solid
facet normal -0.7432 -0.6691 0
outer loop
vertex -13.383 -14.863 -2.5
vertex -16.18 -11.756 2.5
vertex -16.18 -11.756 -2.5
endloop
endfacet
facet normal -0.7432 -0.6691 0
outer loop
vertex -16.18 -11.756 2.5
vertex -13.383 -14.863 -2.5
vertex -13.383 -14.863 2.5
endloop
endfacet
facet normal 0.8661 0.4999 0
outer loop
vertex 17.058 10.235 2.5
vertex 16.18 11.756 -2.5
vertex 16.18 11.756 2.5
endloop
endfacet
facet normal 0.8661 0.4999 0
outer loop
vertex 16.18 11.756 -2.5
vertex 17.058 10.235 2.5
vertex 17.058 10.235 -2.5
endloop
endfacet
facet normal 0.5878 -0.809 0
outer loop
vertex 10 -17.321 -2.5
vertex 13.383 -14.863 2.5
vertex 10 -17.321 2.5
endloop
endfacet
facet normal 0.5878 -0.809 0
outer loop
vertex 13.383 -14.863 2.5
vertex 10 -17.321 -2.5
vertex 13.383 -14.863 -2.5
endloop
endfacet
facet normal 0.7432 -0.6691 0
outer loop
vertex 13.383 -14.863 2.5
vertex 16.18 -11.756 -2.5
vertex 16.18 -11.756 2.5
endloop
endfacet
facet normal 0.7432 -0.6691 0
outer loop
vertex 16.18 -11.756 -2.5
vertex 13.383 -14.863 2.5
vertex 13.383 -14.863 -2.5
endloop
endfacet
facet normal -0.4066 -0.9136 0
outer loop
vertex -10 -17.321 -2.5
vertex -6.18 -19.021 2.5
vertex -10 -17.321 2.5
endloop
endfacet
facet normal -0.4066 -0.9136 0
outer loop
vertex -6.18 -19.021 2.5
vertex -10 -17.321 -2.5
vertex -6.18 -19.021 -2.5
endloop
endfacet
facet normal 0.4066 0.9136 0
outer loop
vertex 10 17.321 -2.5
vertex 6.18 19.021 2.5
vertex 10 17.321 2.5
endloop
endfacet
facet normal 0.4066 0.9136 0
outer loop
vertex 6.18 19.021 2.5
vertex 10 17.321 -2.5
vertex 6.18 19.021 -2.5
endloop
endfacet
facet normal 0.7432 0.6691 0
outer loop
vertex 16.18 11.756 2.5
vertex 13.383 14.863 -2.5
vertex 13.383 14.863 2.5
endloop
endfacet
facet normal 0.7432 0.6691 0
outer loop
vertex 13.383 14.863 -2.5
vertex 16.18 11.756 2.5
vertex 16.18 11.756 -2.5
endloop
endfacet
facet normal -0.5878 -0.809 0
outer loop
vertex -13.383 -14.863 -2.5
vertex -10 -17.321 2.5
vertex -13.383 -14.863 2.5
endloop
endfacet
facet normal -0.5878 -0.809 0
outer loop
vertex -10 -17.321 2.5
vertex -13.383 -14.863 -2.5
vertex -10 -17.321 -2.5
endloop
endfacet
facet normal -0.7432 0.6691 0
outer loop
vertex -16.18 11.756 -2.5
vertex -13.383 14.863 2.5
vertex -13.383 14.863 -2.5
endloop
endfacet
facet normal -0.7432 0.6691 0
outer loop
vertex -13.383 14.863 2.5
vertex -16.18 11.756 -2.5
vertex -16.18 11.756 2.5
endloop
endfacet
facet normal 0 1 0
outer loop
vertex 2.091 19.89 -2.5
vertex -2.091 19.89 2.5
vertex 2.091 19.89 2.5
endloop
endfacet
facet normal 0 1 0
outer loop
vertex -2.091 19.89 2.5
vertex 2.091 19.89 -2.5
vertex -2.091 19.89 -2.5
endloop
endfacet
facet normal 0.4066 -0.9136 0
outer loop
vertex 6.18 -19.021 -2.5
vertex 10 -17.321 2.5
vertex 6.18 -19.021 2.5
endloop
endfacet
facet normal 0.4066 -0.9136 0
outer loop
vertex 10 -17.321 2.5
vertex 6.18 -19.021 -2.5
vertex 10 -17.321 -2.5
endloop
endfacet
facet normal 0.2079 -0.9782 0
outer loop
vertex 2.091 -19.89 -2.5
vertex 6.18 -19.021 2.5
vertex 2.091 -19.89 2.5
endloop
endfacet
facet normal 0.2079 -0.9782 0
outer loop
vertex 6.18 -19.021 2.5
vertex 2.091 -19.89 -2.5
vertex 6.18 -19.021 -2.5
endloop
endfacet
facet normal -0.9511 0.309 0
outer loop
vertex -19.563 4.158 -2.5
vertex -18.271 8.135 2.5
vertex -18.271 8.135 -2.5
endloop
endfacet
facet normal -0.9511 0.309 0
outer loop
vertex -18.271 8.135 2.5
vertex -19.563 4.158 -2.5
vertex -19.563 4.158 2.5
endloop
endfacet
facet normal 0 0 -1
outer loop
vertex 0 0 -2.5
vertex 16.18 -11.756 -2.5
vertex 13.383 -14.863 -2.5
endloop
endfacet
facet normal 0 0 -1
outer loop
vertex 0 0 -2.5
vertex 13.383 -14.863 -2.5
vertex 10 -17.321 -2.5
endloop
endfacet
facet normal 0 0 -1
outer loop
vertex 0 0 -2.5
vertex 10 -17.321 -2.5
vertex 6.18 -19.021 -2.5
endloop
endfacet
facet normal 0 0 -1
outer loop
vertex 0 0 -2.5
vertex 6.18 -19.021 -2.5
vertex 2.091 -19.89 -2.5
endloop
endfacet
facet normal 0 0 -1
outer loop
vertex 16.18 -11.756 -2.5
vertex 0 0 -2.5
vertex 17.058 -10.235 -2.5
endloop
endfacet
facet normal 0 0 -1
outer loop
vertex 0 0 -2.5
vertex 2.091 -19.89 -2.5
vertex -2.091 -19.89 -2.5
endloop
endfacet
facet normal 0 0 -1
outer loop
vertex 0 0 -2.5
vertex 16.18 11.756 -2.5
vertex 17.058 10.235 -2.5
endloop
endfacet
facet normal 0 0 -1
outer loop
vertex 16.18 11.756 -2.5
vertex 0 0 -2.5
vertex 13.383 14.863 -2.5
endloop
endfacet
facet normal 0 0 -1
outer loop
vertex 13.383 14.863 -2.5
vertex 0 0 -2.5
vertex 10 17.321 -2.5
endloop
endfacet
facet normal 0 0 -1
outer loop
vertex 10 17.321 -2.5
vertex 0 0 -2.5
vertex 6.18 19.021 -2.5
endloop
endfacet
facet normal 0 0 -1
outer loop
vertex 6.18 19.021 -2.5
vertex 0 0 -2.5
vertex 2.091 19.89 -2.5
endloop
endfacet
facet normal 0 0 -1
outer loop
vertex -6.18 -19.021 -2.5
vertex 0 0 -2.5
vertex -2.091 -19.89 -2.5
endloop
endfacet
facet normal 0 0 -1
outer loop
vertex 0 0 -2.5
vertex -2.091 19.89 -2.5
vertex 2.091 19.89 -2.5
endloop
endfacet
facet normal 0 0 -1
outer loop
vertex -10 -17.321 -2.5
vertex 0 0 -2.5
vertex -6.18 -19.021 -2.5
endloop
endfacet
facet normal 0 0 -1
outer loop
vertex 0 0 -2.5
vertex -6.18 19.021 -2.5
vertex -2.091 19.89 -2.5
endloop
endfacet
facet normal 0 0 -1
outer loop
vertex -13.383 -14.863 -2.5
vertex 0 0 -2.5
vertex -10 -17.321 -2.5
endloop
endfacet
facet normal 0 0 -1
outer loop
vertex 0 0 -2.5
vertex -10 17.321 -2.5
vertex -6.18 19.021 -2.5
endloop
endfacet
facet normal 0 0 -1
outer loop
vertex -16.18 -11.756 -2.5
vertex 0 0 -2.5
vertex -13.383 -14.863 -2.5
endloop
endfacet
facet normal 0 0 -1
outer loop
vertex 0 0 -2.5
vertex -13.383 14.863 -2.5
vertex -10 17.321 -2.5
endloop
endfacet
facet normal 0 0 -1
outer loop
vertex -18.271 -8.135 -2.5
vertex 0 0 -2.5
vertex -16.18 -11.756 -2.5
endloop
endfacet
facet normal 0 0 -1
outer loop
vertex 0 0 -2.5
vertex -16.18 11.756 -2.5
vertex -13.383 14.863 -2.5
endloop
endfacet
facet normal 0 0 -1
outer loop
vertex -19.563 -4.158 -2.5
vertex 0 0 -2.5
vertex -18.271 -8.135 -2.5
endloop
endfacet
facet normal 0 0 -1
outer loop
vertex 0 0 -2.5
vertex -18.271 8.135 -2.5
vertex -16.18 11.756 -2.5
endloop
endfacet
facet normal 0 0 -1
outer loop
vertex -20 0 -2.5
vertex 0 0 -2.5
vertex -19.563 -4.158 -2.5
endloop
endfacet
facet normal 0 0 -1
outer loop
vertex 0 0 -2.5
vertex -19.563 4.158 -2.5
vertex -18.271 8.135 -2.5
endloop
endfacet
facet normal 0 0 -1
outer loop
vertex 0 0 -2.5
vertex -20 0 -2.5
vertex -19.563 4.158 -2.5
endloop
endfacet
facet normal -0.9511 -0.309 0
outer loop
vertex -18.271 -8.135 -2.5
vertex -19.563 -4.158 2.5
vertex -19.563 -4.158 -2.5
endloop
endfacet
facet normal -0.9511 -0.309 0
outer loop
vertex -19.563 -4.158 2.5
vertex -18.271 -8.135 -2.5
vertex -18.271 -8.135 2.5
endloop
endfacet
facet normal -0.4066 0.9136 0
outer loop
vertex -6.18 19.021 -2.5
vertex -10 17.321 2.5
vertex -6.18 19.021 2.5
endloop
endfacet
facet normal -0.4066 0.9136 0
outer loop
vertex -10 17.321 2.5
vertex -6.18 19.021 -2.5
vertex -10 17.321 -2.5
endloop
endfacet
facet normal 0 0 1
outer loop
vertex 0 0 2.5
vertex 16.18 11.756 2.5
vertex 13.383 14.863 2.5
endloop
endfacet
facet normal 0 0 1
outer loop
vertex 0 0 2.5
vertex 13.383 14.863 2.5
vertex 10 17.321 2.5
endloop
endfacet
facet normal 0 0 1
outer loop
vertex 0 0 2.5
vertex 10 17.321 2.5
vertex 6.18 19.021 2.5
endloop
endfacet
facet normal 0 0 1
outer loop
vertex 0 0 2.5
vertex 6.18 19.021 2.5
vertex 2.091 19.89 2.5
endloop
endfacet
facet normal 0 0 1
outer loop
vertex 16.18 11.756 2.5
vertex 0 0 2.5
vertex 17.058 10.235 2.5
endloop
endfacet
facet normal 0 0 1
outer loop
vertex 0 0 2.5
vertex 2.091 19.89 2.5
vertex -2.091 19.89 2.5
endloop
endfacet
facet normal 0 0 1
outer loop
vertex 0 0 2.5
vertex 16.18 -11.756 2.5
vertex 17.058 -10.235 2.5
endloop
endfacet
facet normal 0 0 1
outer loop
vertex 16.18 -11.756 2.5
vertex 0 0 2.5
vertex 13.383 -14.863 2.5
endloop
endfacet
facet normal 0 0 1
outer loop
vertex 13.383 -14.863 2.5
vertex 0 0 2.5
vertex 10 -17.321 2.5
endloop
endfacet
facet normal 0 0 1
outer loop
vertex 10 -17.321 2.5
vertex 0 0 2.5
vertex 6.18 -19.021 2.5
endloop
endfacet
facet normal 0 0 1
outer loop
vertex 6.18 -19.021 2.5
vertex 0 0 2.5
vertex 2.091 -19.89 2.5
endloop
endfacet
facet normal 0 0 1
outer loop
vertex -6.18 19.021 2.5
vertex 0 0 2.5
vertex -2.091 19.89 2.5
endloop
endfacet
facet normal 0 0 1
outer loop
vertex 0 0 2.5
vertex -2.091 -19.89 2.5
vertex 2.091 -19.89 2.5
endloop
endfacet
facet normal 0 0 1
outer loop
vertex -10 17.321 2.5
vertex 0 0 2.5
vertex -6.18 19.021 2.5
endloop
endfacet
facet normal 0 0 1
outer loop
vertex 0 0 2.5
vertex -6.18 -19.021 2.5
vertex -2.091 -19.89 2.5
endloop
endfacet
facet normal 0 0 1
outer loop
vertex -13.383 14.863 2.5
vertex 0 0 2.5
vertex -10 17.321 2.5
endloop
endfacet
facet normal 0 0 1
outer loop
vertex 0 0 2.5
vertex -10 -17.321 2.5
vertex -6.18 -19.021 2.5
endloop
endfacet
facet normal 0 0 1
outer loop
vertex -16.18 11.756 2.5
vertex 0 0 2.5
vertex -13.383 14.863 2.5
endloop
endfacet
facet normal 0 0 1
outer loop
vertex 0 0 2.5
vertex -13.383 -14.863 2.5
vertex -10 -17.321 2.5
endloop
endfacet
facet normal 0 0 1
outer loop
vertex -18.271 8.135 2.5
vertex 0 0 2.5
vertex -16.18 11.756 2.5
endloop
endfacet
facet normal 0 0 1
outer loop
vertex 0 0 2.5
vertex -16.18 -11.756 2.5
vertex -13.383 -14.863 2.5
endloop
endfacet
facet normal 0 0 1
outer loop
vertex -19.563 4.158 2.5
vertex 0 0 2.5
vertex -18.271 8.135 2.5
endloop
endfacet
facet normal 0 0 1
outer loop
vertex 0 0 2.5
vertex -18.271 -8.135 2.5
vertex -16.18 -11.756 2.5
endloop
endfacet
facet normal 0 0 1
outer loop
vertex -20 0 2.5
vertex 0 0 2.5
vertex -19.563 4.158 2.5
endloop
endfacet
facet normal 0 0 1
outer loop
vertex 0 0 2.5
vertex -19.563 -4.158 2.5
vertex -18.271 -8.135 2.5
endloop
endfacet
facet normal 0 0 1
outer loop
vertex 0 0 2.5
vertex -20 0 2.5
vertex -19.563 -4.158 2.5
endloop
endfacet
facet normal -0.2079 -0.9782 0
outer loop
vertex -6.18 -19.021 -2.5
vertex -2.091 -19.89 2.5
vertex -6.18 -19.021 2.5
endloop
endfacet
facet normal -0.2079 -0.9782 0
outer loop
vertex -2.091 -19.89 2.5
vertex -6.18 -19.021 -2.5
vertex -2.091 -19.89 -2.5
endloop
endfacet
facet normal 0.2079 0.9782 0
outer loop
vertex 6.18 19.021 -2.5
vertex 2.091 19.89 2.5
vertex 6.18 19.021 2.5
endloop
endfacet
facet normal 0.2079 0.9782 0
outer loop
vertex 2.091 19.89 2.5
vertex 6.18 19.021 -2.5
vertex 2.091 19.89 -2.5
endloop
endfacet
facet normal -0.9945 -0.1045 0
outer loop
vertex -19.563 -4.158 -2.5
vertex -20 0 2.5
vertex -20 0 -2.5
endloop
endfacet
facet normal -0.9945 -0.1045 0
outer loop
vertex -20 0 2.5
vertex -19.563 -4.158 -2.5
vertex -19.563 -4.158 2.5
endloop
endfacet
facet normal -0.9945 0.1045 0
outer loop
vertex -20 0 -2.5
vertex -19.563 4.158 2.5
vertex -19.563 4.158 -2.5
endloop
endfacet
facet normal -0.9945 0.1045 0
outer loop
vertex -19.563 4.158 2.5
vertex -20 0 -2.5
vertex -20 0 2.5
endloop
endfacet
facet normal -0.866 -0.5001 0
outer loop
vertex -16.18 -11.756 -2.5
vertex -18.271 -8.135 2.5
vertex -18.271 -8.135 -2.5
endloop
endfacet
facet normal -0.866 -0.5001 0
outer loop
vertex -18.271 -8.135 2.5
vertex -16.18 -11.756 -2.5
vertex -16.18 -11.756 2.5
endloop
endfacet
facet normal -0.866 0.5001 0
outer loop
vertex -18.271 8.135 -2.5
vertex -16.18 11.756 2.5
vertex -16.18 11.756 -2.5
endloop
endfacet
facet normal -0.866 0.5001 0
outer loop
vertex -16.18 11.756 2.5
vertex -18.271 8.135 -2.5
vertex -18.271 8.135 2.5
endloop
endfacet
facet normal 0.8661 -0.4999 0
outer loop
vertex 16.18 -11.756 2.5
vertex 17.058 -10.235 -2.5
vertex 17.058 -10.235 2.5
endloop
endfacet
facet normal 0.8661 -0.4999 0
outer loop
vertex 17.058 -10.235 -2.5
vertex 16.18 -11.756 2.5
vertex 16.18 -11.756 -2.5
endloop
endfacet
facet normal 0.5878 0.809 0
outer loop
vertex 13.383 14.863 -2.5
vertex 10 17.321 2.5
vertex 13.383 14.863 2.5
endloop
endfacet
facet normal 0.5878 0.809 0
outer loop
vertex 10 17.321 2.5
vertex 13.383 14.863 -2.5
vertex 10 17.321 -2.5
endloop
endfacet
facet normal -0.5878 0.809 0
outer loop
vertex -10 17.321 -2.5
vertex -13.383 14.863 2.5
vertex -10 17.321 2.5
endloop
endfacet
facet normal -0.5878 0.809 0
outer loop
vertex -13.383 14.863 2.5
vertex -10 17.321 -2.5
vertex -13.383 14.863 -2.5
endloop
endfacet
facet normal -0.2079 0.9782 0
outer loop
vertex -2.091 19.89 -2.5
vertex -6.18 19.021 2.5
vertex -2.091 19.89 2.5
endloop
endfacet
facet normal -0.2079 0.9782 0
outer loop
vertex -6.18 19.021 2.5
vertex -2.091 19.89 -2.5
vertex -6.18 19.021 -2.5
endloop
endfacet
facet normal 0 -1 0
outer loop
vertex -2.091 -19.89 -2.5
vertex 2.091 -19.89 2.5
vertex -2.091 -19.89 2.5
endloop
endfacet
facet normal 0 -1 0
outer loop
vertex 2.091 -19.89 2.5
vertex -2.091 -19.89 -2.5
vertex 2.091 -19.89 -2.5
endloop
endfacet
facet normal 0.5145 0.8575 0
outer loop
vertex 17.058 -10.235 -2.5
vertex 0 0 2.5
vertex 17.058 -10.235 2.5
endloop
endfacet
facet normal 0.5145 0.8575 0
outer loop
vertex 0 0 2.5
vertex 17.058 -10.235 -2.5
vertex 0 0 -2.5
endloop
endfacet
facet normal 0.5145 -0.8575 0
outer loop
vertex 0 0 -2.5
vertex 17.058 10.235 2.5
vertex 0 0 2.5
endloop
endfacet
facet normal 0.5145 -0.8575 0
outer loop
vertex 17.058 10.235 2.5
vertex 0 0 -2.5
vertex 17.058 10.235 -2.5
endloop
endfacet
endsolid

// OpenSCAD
difference () {
  cylinder(r=20, center=true, h=5);
  linear_extrude(height=50, center=true, convexity = 10, twist = 0) {
      polygon(points=[[0,0],[100,60],[100,-60]], paths=[[0,1,2]]);
  }
}
